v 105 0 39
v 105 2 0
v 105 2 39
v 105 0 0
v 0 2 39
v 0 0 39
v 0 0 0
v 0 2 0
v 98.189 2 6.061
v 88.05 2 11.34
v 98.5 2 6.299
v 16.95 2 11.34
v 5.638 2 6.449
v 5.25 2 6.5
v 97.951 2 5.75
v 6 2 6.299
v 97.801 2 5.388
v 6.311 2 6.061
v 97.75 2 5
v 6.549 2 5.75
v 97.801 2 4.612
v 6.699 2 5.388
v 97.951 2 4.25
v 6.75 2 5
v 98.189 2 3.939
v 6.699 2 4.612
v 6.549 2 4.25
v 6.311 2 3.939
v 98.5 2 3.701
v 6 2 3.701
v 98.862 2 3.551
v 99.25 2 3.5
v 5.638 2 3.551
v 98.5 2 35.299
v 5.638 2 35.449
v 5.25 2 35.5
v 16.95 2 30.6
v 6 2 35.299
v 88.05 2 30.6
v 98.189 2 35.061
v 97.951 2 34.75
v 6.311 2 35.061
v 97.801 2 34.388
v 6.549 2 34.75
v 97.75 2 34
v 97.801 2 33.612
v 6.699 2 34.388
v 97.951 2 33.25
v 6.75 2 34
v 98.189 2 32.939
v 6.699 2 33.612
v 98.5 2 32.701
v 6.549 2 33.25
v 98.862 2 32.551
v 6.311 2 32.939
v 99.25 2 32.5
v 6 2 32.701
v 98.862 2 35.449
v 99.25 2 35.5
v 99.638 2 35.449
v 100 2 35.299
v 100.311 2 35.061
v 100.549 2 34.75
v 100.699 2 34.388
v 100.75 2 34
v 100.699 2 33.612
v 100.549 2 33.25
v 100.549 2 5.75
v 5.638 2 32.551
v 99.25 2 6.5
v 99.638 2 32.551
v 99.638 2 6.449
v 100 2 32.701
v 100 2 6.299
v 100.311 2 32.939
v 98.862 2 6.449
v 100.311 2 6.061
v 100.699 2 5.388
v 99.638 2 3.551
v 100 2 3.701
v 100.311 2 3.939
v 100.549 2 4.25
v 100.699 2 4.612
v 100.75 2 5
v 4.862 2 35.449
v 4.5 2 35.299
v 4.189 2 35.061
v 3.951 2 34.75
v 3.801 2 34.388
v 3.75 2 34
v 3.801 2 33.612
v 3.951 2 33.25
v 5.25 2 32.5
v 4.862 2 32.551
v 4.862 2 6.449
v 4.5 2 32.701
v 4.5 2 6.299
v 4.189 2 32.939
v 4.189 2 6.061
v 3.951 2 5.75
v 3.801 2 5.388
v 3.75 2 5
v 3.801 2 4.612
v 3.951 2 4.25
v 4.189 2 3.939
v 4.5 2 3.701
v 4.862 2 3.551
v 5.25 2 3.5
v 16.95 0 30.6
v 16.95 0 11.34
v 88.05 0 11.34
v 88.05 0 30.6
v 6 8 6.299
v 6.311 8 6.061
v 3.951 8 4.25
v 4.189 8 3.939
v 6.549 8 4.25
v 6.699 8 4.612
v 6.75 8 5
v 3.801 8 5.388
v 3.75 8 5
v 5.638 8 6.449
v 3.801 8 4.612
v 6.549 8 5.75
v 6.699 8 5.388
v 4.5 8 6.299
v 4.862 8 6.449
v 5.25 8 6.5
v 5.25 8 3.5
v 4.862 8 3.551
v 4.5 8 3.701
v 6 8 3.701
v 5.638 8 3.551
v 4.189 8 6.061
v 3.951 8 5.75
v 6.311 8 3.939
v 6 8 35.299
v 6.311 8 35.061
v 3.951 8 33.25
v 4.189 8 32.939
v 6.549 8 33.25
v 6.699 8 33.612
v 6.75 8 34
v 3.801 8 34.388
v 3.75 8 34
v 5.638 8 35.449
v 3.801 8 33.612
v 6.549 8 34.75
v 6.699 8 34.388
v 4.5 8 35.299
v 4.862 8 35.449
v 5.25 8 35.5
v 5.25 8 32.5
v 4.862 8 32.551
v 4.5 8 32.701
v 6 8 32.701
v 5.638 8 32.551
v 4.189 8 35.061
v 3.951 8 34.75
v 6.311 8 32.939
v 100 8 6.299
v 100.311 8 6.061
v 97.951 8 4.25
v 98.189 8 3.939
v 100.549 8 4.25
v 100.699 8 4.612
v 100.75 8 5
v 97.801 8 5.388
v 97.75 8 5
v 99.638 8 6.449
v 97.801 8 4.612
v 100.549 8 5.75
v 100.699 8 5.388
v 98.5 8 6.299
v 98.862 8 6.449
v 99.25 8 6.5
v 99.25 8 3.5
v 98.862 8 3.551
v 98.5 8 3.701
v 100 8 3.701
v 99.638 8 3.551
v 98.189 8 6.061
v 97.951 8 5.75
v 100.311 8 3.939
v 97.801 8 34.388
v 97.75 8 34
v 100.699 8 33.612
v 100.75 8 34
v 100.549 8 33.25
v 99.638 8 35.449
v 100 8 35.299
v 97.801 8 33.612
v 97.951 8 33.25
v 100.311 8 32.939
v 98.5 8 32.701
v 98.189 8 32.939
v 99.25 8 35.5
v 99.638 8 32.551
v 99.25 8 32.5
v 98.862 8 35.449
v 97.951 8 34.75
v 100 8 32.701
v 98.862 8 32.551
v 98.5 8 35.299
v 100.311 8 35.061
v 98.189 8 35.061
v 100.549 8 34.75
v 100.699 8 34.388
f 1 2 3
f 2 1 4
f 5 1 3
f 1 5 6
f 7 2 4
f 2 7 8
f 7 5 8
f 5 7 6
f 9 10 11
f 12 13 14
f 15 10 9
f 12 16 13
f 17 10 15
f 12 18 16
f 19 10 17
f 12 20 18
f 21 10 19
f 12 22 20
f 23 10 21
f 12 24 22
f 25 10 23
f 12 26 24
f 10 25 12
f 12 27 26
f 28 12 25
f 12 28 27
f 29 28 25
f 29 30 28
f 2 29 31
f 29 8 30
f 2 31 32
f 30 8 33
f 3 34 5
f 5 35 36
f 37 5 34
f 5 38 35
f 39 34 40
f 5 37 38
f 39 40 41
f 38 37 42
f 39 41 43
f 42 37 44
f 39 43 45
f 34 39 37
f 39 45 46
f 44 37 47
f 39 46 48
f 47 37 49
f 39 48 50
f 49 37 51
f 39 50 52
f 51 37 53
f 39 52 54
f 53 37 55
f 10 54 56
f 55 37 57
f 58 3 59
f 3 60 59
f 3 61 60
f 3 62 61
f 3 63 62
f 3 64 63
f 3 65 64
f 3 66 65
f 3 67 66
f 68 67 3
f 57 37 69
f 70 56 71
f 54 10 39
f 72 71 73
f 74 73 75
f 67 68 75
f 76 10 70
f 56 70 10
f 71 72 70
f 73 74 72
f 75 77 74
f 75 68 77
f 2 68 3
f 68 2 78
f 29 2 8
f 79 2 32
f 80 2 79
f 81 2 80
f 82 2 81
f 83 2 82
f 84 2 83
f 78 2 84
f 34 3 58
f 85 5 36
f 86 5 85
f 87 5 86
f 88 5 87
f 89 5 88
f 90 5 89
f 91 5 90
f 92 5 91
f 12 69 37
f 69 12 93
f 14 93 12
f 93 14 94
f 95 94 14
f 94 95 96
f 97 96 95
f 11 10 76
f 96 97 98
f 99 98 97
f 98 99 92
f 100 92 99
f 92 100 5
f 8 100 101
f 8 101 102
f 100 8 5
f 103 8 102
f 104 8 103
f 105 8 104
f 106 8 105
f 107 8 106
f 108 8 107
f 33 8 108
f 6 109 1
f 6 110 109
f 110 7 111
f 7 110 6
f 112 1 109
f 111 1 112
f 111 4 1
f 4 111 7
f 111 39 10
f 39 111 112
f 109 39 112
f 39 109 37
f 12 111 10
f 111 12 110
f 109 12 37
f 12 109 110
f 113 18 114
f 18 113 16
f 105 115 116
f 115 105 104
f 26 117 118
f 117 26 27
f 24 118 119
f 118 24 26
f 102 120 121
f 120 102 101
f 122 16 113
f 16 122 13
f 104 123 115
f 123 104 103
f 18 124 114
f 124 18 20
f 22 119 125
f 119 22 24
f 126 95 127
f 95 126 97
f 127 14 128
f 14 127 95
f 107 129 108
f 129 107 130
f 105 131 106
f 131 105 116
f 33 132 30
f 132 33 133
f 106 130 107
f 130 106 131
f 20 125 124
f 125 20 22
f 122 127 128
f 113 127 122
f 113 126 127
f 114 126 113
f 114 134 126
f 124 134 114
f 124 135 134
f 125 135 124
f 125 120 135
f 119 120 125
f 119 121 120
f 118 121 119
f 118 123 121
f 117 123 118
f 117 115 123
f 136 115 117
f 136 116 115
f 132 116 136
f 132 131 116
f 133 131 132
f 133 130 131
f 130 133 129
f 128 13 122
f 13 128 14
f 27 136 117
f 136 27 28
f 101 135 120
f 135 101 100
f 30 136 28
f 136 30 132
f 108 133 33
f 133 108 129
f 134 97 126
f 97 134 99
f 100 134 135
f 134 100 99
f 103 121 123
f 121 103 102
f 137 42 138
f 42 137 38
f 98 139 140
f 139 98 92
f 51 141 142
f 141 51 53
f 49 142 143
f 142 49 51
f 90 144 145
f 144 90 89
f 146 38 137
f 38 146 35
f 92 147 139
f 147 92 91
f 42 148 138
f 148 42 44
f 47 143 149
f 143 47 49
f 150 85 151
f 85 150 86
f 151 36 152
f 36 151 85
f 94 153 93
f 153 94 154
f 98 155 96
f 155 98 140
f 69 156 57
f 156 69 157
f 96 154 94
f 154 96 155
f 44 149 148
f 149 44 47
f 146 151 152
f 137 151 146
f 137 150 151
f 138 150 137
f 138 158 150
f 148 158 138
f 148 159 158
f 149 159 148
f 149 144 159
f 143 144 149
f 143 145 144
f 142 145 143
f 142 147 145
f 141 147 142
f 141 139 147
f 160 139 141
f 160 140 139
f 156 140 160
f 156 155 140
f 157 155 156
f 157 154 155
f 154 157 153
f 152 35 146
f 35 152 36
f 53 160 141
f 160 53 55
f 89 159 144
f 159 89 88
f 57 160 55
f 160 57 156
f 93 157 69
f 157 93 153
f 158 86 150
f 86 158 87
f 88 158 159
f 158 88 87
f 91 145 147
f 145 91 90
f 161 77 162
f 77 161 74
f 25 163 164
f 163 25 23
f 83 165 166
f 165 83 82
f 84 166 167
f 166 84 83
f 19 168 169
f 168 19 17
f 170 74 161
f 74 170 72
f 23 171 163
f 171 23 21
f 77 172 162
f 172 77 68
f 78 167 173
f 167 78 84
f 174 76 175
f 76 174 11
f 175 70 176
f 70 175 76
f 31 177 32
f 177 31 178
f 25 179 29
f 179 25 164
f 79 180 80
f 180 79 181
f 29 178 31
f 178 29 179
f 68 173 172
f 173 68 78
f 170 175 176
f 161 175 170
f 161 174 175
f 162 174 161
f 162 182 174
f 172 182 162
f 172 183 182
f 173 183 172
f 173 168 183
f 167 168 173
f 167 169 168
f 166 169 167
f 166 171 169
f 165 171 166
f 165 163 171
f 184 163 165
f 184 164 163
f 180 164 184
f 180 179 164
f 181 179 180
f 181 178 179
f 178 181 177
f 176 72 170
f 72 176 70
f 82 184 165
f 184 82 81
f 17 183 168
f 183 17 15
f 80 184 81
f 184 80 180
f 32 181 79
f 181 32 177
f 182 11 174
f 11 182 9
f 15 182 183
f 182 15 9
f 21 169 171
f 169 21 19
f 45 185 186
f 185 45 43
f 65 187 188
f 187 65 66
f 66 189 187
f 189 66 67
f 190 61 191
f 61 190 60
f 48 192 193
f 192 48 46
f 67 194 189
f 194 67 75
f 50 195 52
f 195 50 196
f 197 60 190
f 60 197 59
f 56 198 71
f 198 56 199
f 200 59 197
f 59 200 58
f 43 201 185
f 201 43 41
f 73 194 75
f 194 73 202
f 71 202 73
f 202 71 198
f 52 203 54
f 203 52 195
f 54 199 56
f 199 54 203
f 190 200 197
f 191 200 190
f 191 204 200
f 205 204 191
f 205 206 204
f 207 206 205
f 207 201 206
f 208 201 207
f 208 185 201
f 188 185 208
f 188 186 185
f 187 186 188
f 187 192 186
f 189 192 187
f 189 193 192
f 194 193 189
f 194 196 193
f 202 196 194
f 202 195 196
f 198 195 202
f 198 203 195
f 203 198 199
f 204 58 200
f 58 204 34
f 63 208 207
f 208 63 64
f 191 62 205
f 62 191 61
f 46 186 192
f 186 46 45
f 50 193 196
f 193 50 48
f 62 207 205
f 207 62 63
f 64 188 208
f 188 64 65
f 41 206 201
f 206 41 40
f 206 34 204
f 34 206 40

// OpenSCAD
$fa = 1;
$fs = 0.4;

difference(){
    cube([105,2,39]);
    translate([16.95,0,11.34])
        cube([71.10,2,19.26]);
}
rotate([270,0,0])
    translate([5.25,-5,2])
        cylinder(h=6,r=1.5);
rotate([270,0,0])
    translate([5.25,-34,2])
        cylinder(h=6,r=1.5);
rotate([270,0,0])
    translate([99.25,-5,2])
        cylinder(h=6,r=1.5);
rotate([270,0,0])
    translate([99.25,-34,2])
        cylinder(h=6,r=1.5);
